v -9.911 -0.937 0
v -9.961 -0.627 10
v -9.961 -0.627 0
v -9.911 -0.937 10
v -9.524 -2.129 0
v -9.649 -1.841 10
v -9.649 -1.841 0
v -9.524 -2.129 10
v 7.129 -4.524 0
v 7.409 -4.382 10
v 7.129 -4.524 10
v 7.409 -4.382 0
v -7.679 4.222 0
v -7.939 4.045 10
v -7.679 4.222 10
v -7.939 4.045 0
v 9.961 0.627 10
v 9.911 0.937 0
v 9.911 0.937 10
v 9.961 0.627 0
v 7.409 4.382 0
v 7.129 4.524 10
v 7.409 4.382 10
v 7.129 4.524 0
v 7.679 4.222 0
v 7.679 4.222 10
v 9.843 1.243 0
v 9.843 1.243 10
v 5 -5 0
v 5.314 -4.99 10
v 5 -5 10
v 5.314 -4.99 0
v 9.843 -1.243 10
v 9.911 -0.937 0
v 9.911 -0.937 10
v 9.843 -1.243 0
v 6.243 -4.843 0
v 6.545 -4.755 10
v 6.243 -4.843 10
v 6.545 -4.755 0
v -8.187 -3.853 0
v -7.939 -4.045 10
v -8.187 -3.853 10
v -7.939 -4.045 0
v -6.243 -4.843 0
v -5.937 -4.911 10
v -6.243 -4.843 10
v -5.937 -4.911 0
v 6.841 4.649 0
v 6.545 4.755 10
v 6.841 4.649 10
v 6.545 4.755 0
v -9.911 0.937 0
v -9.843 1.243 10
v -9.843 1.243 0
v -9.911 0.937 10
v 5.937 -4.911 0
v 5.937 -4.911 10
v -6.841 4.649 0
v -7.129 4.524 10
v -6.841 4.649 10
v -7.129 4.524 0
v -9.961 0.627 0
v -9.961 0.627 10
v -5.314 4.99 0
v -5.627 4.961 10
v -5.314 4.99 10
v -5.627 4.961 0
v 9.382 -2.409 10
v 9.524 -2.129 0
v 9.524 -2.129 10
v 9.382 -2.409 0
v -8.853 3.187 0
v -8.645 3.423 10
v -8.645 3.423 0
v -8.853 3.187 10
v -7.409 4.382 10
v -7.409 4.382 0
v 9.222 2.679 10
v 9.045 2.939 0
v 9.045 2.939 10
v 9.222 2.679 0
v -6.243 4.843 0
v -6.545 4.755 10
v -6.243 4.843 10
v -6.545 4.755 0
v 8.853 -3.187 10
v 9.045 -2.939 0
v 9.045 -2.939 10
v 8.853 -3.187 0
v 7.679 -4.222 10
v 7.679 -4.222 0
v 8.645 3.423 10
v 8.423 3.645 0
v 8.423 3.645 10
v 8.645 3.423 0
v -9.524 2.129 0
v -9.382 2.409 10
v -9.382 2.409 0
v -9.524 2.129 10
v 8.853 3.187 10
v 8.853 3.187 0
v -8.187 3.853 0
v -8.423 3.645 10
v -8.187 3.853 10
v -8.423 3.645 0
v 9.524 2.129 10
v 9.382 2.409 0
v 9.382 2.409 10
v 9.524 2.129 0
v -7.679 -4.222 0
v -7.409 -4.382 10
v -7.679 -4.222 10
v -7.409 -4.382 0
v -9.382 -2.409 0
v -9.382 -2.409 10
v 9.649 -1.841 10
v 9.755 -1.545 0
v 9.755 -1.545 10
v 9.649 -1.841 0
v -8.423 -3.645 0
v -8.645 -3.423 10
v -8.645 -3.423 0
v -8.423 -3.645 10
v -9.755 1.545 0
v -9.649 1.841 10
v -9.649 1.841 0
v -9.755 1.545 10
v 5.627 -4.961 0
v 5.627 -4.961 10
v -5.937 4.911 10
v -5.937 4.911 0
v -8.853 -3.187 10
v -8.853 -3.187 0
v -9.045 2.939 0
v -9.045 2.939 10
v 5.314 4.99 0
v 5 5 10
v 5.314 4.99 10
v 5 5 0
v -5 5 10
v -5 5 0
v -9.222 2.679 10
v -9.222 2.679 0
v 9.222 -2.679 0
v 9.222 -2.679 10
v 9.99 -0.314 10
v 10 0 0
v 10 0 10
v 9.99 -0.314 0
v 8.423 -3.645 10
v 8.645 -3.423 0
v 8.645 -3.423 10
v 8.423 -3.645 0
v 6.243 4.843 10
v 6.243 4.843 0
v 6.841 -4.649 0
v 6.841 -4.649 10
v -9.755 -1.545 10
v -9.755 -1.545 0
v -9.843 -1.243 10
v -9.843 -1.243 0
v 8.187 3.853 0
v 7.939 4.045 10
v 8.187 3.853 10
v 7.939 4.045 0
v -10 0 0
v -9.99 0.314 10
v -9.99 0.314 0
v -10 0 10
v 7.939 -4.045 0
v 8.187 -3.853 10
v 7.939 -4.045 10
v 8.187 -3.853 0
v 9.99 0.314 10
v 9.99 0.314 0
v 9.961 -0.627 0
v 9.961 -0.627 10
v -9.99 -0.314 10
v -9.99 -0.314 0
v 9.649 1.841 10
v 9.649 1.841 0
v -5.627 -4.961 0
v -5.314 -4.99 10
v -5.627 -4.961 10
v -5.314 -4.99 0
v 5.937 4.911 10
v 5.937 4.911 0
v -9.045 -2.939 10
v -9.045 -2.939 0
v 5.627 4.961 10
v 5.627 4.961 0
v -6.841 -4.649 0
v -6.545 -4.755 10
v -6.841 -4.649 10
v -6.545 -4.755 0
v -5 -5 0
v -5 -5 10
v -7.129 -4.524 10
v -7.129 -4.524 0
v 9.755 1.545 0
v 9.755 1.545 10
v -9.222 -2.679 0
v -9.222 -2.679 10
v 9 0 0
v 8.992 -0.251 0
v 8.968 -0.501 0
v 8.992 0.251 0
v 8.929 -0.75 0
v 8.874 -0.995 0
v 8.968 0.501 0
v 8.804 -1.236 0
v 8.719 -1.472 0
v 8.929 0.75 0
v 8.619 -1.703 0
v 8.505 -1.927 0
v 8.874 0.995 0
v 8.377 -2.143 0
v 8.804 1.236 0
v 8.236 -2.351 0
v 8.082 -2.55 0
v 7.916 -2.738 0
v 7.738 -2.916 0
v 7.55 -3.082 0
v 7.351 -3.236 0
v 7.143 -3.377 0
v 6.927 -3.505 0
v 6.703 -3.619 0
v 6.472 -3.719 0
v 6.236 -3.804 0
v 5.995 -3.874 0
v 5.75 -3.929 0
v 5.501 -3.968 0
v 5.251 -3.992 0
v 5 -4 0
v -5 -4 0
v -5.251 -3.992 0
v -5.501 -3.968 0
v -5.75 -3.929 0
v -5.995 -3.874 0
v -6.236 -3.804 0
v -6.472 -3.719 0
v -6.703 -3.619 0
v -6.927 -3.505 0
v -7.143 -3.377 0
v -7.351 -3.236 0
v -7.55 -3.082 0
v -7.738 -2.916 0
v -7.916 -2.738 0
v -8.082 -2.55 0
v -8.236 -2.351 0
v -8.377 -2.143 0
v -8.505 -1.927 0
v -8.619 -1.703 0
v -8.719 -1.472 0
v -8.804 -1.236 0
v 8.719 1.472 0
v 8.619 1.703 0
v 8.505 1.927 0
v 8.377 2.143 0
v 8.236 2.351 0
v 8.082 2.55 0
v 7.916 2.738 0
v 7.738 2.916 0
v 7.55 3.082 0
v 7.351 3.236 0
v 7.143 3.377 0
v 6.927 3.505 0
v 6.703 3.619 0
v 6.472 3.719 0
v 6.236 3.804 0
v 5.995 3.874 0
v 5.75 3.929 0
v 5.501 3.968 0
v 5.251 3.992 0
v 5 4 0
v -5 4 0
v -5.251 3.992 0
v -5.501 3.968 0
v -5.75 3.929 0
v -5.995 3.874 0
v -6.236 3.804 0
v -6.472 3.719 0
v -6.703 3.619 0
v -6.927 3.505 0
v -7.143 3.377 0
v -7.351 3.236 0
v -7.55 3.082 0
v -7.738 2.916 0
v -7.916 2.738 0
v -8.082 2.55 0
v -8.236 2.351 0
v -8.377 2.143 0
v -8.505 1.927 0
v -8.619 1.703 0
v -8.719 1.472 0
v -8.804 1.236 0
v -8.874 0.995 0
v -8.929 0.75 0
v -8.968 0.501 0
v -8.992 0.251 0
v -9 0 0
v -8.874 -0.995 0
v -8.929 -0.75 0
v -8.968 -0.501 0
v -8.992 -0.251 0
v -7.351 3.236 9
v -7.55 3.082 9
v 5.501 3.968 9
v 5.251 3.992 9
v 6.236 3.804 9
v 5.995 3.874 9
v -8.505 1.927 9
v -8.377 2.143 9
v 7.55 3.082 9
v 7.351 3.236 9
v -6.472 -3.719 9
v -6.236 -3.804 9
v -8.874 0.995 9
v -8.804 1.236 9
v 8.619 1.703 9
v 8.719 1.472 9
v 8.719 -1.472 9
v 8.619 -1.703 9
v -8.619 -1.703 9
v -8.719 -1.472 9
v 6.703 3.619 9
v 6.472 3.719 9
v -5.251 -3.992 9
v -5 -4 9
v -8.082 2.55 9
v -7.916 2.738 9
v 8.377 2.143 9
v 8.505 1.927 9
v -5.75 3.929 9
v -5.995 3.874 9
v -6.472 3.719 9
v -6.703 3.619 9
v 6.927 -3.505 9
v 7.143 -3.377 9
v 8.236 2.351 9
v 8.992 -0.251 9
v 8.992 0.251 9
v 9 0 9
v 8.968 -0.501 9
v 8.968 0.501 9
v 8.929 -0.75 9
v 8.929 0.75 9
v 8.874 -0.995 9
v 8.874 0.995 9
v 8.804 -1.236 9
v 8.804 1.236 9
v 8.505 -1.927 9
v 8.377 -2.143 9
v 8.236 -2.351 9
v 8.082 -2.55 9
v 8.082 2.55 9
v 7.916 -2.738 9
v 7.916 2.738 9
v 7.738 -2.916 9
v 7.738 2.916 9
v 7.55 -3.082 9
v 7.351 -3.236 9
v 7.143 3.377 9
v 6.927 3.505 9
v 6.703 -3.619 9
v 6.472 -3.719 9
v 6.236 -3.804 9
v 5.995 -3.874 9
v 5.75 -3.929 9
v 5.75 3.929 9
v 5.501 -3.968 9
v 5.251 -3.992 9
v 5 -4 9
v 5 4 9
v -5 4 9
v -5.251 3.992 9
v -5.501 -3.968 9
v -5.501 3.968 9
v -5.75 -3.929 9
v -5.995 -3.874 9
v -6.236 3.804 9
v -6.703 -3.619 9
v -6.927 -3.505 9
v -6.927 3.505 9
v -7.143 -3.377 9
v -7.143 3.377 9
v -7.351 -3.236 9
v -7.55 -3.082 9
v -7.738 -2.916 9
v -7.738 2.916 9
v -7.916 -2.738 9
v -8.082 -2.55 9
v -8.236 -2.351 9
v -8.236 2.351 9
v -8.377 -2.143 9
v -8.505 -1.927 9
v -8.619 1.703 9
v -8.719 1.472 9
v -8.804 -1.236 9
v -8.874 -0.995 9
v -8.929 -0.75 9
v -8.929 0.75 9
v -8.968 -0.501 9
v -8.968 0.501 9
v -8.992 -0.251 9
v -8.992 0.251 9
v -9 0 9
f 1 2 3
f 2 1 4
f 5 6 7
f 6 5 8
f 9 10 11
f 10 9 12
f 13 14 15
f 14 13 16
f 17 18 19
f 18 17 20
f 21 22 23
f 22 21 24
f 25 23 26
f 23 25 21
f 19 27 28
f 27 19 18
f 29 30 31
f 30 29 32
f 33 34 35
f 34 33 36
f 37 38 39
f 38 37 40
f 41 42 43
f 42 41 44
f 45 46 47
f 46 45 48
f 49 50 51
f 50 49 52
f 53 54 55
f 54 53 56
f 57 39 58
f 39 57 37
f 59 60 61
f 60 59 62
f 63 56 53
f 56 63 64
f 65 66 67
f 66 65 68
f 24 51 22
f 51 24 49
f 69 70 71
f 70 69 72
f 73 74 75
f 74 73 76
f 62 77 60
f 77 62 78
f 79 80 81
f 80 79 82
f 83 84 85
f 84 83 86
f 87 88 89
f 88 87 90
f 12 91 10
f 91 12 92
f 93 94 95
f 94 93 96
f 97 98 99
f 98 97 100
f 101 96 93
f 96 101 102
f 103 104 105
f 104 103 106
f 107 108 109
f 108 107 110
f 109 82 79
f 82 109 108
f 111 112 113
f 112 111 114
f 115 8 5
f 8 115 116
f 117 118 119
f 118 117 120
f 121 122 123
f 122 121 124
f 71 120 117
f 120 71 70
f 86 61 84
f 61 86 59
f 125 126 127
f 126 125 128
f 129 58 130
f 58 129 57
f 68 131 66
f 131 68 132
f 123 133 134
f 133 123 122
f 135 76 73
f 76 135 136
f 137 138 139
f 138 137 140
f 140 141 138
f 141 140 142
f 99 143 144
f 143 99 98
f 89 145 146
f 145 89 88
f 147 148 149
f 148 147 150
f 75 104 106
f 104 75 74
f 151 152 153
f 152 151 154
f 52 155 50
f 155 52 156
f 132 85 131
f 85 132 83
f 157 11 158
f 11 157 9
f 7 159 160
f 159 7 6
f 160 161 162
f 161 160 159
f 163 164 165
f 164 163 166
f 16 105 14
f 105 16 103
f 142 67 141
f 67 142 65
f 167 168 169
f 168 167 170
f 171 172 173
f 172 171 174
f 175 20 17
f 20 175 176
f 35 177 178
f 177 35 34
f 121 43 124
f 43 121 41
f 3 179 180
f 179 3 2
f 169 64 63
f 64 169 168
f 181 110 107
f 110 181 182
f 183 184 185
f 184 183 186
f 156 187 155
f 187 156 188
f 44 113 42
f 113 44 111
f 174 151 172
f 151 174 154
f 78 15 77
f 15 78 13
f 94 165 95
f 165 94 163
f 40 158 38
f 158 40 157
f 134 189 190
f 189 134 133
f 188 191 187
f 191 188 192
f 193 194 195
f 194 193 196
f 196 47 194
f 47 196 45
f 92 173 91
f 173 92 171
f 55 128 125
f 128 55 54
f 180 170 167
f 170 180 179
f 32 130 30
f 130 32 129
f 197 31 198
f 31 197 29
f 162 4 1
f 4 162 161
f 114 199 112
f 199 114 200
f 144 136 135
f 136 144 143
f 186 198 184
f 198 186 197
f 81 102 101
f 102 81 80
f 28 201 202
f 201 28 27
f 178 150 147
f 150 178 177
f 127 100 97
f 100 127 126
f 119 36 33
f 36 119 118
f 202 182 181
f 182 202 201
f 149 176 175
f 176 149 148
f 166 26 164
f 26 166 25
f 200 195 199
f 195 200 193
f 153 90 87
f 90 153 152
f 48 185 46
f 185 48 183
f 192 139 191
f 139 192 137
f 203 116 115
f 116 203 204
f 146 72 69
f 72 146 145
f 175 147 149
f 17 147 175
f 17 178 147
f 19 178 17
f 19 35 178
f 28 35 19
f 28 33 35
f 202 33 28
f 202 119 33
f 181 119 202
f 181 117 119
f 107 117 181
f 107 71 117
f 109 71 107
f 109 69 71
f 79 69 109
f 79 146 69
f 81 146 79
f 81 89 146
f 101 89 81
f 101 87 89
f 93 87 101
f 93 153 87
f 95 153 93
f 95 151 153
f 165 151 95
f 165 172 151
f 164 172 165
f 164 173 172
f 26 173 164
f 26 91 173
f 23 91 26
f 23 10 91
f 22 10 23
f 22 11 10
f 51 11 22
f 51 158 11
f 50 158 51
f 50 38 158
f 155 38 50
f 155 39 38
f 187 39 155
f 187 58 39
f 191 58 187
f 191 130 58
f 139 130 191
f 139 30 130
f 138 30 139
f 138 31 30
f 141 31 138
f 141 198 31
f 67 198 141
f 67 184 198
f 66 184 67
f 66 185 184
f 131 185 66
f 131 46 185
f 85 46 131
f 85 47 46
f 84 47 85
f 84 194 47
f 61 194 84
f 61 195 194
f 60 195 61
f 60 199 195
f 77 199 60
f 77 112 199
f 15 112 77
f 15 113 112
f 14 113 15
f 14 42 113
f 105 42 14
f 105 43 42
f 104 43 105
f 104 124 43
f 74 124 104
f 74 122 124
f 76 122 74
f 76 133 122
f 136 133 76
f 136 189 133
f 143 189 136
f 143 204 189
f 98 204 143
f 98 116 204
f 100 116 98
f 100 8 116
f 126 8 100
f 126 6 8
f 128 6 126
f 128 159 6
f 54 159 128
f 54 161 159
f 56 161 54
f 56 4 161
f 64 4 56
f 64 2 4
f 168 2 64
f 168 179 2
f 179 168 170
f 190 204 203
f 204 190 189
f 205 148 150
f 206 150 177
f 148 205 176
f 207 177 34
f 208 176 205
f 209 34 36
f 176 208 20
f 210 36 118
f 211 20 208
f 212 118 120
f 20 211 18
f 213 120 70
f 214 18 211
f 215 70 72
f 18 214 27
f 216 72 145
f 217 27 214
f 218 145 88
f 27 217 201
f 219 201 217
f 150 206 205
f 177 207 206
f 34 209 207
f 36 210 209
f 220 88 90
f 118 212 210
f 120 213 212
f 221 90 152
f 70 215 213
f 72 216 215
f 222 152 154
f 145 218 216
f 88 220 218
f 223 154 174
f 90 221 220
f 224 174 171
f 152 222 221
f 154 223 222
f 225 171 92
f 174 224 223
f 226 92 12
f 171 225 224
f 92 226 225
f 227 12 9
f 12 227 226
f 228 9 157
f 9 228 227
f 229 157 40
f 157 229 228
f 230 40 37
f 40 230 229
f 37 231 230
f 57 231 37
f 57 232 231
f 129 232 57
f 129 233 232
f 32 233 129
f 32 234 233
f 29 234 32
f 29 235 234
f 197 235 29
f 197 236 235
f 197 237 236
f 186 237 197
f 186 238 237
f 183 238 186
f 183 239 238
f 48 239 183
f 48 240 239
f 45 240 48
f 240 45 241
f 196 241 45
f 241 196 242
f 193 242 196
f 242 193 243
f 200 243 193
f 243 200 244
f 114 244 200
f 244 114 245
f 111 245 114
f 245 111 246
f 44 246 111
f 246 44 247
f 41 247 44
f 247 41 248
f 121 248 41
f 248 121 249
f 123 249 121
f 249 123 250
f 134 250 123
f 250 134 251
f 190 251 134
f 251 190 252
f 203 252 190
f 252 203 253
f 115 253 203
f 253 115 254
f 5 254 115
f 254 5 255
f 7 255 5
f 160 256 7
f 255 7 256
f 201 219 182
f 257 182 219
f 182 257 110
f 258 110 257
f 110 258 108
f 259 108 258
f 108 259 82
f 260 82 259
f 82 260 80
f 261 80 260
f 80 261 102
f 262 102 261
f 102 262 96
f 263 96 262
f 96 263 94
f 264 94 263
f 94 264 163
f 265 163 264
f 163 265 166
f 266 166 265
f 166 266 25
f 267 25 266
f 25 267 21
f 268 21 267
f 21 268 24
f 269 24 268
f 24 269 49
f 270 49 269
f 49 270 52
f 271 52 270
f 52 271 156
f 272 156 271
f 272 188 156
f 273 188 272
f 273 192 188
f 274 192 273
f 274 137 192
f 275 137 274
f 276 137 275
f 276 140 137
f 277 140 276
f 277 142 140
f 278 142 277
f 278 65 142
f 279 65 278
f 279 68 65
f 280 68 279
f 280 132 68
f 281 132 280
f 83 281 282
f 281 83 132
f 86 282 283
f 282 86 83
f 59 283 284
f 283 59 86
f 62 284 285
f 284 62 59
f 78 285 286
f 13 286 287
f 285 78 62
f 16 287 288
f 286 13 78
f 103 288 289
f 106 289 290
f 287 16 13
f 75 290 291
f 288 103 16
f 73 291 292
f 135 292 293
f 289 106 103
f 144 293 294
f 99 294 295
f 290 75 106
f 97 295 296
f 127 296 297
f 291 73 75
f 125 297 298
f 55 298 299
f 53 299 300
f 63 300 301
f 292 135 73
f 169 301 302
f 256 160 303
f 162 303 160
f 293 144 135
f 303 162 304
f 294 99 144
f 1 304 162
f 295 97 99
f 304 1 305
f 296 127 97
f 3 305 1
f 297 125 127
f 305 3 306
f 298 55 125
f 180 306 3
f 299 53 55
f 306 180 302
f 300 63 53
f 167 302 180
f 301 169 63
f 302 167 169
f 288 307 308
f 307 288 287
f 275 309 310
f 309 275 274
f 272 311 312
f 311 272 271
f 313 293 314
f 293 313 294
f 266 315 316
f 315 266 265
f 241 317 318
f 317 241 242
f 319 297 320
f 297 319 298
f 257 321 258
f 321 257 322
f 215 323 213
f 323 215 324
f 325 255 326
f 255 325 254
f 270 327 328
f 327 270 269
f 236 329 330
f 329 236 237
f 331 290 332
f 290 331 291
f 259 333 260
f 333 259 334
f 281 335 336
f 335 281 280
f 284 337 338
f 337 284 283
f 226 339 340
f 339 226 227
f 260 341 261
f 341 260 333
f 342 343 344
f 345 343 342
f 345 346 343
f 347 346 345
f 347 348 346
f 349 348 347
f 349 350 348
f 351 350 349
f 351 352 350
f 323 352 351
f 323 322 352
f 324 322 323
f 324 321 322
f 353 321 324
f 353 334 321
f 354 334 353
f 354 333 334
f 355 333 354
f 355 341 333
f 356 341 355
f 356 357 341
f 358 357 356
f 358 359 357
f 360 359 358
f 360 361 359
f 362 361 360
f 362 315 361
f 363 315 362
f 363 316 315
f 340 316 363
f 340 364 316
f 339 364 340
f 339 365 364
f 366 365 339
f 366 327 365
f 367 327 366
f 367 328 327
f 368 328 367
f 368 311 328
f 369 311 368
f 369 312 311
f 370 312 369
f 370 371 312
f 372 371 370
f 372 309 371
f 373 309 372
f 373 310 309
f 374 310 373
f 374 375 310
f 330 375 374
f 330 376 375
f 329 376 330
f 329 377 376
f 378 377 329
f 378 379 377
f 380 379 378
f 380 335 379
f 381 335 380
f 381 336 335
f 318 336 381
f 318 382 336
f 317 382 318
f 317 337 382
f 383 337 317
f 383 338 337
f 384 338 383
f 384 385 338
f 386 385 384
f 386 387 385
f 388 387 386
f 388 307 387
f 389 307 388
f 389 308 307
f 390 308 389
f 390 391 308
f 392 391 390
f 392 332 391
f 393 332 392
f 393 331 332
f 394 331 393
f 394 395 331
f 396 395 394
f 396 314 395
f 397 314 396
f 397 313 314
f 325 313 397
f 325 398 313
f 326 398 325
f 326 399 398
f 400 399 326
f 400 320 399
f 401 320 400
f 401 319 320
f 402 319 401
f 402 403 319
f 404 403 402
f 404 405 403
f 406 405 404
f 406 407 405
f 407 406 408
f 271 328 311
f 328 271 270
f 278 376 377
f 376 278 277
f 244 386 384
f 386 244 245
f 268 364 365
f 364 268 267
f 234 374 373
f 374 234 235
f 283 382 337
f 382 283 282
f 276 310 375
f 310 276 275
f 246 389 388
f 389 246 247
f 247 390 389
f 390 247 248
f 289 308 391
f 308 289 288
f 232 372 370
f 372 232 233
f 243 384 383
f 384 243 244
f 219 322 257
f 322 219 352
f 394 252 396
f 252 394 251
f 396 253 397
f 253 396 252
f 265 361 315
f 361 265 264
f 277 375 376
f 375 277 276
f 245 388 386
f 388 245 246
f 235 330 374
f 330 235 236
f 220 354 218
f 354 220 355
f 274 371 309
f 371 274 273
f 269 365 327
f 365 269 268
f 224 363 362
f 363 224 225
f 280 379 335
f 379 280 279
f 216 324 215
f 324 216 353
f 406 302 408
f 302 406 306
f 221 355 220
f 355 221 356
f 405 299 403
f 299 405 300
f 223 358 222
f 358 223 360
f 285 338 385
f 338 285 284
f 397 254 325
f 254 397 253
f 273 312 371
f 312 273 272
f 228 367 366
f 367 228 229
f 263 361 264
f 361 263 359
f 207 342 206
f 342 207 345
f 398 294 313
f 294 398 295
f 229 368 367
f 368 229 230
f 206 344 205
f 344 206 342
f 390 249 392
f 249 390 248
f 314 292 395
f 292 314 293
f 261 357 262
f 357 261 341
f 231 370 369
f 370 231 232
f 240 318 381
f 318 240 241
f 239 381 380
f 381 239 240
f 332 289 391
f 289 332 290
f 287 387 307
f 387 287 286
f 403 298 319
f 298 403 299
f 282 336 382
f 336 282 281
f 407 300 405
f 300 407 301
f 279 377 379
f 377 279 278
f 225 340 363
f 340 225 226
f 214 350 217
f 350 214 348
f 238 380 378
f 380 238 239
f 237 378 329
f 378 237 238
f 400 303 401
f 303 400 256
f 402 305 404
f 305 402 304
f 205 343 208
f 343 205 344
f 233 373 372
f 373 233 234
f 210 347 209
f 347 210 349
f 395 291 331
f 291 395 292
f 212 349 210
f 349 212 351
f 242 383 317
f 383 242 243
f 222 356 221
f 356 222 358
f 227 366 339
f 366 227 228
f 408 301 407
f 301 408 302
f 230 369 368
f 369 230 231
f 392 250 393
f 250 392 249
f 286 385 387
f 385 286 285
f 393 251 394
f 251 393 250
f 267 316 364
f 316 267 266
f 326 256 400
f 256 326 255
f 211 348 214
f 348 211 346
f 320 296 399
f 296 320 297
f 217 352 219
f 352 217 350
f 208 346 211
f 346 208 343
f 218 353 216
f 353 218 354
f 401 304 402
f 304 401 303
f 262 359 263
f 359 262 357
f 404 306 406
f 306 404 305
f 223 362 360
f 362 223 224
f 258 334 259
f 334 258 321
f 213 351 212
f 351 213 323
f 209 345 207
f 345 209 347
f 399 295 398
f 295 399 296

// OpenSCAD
//outer dimensions of box
length = 20;
width = 5;
height = 10;

//thickness of wall of box
wall_thickness = 1;

module rounded_box(l,w,h,wt){
module outer_hull(l,w,h){
hull() {
    translate([(l/2)-w,0,0]){
        linear_extrude(h){
           circle(w, $fn = 100);
        };
    }
    translate([-((l/2)-w),0,0]){
        linear_extrude(h){
           circle(w, $fn = 100);
        };
  }
}
}

difference(){
    outer_hull(l,w,h);
    outer_hull(l-(wt*2),w-wt,h-wt);
}
}
rounded_box(length,width,height,wall_thickness);
